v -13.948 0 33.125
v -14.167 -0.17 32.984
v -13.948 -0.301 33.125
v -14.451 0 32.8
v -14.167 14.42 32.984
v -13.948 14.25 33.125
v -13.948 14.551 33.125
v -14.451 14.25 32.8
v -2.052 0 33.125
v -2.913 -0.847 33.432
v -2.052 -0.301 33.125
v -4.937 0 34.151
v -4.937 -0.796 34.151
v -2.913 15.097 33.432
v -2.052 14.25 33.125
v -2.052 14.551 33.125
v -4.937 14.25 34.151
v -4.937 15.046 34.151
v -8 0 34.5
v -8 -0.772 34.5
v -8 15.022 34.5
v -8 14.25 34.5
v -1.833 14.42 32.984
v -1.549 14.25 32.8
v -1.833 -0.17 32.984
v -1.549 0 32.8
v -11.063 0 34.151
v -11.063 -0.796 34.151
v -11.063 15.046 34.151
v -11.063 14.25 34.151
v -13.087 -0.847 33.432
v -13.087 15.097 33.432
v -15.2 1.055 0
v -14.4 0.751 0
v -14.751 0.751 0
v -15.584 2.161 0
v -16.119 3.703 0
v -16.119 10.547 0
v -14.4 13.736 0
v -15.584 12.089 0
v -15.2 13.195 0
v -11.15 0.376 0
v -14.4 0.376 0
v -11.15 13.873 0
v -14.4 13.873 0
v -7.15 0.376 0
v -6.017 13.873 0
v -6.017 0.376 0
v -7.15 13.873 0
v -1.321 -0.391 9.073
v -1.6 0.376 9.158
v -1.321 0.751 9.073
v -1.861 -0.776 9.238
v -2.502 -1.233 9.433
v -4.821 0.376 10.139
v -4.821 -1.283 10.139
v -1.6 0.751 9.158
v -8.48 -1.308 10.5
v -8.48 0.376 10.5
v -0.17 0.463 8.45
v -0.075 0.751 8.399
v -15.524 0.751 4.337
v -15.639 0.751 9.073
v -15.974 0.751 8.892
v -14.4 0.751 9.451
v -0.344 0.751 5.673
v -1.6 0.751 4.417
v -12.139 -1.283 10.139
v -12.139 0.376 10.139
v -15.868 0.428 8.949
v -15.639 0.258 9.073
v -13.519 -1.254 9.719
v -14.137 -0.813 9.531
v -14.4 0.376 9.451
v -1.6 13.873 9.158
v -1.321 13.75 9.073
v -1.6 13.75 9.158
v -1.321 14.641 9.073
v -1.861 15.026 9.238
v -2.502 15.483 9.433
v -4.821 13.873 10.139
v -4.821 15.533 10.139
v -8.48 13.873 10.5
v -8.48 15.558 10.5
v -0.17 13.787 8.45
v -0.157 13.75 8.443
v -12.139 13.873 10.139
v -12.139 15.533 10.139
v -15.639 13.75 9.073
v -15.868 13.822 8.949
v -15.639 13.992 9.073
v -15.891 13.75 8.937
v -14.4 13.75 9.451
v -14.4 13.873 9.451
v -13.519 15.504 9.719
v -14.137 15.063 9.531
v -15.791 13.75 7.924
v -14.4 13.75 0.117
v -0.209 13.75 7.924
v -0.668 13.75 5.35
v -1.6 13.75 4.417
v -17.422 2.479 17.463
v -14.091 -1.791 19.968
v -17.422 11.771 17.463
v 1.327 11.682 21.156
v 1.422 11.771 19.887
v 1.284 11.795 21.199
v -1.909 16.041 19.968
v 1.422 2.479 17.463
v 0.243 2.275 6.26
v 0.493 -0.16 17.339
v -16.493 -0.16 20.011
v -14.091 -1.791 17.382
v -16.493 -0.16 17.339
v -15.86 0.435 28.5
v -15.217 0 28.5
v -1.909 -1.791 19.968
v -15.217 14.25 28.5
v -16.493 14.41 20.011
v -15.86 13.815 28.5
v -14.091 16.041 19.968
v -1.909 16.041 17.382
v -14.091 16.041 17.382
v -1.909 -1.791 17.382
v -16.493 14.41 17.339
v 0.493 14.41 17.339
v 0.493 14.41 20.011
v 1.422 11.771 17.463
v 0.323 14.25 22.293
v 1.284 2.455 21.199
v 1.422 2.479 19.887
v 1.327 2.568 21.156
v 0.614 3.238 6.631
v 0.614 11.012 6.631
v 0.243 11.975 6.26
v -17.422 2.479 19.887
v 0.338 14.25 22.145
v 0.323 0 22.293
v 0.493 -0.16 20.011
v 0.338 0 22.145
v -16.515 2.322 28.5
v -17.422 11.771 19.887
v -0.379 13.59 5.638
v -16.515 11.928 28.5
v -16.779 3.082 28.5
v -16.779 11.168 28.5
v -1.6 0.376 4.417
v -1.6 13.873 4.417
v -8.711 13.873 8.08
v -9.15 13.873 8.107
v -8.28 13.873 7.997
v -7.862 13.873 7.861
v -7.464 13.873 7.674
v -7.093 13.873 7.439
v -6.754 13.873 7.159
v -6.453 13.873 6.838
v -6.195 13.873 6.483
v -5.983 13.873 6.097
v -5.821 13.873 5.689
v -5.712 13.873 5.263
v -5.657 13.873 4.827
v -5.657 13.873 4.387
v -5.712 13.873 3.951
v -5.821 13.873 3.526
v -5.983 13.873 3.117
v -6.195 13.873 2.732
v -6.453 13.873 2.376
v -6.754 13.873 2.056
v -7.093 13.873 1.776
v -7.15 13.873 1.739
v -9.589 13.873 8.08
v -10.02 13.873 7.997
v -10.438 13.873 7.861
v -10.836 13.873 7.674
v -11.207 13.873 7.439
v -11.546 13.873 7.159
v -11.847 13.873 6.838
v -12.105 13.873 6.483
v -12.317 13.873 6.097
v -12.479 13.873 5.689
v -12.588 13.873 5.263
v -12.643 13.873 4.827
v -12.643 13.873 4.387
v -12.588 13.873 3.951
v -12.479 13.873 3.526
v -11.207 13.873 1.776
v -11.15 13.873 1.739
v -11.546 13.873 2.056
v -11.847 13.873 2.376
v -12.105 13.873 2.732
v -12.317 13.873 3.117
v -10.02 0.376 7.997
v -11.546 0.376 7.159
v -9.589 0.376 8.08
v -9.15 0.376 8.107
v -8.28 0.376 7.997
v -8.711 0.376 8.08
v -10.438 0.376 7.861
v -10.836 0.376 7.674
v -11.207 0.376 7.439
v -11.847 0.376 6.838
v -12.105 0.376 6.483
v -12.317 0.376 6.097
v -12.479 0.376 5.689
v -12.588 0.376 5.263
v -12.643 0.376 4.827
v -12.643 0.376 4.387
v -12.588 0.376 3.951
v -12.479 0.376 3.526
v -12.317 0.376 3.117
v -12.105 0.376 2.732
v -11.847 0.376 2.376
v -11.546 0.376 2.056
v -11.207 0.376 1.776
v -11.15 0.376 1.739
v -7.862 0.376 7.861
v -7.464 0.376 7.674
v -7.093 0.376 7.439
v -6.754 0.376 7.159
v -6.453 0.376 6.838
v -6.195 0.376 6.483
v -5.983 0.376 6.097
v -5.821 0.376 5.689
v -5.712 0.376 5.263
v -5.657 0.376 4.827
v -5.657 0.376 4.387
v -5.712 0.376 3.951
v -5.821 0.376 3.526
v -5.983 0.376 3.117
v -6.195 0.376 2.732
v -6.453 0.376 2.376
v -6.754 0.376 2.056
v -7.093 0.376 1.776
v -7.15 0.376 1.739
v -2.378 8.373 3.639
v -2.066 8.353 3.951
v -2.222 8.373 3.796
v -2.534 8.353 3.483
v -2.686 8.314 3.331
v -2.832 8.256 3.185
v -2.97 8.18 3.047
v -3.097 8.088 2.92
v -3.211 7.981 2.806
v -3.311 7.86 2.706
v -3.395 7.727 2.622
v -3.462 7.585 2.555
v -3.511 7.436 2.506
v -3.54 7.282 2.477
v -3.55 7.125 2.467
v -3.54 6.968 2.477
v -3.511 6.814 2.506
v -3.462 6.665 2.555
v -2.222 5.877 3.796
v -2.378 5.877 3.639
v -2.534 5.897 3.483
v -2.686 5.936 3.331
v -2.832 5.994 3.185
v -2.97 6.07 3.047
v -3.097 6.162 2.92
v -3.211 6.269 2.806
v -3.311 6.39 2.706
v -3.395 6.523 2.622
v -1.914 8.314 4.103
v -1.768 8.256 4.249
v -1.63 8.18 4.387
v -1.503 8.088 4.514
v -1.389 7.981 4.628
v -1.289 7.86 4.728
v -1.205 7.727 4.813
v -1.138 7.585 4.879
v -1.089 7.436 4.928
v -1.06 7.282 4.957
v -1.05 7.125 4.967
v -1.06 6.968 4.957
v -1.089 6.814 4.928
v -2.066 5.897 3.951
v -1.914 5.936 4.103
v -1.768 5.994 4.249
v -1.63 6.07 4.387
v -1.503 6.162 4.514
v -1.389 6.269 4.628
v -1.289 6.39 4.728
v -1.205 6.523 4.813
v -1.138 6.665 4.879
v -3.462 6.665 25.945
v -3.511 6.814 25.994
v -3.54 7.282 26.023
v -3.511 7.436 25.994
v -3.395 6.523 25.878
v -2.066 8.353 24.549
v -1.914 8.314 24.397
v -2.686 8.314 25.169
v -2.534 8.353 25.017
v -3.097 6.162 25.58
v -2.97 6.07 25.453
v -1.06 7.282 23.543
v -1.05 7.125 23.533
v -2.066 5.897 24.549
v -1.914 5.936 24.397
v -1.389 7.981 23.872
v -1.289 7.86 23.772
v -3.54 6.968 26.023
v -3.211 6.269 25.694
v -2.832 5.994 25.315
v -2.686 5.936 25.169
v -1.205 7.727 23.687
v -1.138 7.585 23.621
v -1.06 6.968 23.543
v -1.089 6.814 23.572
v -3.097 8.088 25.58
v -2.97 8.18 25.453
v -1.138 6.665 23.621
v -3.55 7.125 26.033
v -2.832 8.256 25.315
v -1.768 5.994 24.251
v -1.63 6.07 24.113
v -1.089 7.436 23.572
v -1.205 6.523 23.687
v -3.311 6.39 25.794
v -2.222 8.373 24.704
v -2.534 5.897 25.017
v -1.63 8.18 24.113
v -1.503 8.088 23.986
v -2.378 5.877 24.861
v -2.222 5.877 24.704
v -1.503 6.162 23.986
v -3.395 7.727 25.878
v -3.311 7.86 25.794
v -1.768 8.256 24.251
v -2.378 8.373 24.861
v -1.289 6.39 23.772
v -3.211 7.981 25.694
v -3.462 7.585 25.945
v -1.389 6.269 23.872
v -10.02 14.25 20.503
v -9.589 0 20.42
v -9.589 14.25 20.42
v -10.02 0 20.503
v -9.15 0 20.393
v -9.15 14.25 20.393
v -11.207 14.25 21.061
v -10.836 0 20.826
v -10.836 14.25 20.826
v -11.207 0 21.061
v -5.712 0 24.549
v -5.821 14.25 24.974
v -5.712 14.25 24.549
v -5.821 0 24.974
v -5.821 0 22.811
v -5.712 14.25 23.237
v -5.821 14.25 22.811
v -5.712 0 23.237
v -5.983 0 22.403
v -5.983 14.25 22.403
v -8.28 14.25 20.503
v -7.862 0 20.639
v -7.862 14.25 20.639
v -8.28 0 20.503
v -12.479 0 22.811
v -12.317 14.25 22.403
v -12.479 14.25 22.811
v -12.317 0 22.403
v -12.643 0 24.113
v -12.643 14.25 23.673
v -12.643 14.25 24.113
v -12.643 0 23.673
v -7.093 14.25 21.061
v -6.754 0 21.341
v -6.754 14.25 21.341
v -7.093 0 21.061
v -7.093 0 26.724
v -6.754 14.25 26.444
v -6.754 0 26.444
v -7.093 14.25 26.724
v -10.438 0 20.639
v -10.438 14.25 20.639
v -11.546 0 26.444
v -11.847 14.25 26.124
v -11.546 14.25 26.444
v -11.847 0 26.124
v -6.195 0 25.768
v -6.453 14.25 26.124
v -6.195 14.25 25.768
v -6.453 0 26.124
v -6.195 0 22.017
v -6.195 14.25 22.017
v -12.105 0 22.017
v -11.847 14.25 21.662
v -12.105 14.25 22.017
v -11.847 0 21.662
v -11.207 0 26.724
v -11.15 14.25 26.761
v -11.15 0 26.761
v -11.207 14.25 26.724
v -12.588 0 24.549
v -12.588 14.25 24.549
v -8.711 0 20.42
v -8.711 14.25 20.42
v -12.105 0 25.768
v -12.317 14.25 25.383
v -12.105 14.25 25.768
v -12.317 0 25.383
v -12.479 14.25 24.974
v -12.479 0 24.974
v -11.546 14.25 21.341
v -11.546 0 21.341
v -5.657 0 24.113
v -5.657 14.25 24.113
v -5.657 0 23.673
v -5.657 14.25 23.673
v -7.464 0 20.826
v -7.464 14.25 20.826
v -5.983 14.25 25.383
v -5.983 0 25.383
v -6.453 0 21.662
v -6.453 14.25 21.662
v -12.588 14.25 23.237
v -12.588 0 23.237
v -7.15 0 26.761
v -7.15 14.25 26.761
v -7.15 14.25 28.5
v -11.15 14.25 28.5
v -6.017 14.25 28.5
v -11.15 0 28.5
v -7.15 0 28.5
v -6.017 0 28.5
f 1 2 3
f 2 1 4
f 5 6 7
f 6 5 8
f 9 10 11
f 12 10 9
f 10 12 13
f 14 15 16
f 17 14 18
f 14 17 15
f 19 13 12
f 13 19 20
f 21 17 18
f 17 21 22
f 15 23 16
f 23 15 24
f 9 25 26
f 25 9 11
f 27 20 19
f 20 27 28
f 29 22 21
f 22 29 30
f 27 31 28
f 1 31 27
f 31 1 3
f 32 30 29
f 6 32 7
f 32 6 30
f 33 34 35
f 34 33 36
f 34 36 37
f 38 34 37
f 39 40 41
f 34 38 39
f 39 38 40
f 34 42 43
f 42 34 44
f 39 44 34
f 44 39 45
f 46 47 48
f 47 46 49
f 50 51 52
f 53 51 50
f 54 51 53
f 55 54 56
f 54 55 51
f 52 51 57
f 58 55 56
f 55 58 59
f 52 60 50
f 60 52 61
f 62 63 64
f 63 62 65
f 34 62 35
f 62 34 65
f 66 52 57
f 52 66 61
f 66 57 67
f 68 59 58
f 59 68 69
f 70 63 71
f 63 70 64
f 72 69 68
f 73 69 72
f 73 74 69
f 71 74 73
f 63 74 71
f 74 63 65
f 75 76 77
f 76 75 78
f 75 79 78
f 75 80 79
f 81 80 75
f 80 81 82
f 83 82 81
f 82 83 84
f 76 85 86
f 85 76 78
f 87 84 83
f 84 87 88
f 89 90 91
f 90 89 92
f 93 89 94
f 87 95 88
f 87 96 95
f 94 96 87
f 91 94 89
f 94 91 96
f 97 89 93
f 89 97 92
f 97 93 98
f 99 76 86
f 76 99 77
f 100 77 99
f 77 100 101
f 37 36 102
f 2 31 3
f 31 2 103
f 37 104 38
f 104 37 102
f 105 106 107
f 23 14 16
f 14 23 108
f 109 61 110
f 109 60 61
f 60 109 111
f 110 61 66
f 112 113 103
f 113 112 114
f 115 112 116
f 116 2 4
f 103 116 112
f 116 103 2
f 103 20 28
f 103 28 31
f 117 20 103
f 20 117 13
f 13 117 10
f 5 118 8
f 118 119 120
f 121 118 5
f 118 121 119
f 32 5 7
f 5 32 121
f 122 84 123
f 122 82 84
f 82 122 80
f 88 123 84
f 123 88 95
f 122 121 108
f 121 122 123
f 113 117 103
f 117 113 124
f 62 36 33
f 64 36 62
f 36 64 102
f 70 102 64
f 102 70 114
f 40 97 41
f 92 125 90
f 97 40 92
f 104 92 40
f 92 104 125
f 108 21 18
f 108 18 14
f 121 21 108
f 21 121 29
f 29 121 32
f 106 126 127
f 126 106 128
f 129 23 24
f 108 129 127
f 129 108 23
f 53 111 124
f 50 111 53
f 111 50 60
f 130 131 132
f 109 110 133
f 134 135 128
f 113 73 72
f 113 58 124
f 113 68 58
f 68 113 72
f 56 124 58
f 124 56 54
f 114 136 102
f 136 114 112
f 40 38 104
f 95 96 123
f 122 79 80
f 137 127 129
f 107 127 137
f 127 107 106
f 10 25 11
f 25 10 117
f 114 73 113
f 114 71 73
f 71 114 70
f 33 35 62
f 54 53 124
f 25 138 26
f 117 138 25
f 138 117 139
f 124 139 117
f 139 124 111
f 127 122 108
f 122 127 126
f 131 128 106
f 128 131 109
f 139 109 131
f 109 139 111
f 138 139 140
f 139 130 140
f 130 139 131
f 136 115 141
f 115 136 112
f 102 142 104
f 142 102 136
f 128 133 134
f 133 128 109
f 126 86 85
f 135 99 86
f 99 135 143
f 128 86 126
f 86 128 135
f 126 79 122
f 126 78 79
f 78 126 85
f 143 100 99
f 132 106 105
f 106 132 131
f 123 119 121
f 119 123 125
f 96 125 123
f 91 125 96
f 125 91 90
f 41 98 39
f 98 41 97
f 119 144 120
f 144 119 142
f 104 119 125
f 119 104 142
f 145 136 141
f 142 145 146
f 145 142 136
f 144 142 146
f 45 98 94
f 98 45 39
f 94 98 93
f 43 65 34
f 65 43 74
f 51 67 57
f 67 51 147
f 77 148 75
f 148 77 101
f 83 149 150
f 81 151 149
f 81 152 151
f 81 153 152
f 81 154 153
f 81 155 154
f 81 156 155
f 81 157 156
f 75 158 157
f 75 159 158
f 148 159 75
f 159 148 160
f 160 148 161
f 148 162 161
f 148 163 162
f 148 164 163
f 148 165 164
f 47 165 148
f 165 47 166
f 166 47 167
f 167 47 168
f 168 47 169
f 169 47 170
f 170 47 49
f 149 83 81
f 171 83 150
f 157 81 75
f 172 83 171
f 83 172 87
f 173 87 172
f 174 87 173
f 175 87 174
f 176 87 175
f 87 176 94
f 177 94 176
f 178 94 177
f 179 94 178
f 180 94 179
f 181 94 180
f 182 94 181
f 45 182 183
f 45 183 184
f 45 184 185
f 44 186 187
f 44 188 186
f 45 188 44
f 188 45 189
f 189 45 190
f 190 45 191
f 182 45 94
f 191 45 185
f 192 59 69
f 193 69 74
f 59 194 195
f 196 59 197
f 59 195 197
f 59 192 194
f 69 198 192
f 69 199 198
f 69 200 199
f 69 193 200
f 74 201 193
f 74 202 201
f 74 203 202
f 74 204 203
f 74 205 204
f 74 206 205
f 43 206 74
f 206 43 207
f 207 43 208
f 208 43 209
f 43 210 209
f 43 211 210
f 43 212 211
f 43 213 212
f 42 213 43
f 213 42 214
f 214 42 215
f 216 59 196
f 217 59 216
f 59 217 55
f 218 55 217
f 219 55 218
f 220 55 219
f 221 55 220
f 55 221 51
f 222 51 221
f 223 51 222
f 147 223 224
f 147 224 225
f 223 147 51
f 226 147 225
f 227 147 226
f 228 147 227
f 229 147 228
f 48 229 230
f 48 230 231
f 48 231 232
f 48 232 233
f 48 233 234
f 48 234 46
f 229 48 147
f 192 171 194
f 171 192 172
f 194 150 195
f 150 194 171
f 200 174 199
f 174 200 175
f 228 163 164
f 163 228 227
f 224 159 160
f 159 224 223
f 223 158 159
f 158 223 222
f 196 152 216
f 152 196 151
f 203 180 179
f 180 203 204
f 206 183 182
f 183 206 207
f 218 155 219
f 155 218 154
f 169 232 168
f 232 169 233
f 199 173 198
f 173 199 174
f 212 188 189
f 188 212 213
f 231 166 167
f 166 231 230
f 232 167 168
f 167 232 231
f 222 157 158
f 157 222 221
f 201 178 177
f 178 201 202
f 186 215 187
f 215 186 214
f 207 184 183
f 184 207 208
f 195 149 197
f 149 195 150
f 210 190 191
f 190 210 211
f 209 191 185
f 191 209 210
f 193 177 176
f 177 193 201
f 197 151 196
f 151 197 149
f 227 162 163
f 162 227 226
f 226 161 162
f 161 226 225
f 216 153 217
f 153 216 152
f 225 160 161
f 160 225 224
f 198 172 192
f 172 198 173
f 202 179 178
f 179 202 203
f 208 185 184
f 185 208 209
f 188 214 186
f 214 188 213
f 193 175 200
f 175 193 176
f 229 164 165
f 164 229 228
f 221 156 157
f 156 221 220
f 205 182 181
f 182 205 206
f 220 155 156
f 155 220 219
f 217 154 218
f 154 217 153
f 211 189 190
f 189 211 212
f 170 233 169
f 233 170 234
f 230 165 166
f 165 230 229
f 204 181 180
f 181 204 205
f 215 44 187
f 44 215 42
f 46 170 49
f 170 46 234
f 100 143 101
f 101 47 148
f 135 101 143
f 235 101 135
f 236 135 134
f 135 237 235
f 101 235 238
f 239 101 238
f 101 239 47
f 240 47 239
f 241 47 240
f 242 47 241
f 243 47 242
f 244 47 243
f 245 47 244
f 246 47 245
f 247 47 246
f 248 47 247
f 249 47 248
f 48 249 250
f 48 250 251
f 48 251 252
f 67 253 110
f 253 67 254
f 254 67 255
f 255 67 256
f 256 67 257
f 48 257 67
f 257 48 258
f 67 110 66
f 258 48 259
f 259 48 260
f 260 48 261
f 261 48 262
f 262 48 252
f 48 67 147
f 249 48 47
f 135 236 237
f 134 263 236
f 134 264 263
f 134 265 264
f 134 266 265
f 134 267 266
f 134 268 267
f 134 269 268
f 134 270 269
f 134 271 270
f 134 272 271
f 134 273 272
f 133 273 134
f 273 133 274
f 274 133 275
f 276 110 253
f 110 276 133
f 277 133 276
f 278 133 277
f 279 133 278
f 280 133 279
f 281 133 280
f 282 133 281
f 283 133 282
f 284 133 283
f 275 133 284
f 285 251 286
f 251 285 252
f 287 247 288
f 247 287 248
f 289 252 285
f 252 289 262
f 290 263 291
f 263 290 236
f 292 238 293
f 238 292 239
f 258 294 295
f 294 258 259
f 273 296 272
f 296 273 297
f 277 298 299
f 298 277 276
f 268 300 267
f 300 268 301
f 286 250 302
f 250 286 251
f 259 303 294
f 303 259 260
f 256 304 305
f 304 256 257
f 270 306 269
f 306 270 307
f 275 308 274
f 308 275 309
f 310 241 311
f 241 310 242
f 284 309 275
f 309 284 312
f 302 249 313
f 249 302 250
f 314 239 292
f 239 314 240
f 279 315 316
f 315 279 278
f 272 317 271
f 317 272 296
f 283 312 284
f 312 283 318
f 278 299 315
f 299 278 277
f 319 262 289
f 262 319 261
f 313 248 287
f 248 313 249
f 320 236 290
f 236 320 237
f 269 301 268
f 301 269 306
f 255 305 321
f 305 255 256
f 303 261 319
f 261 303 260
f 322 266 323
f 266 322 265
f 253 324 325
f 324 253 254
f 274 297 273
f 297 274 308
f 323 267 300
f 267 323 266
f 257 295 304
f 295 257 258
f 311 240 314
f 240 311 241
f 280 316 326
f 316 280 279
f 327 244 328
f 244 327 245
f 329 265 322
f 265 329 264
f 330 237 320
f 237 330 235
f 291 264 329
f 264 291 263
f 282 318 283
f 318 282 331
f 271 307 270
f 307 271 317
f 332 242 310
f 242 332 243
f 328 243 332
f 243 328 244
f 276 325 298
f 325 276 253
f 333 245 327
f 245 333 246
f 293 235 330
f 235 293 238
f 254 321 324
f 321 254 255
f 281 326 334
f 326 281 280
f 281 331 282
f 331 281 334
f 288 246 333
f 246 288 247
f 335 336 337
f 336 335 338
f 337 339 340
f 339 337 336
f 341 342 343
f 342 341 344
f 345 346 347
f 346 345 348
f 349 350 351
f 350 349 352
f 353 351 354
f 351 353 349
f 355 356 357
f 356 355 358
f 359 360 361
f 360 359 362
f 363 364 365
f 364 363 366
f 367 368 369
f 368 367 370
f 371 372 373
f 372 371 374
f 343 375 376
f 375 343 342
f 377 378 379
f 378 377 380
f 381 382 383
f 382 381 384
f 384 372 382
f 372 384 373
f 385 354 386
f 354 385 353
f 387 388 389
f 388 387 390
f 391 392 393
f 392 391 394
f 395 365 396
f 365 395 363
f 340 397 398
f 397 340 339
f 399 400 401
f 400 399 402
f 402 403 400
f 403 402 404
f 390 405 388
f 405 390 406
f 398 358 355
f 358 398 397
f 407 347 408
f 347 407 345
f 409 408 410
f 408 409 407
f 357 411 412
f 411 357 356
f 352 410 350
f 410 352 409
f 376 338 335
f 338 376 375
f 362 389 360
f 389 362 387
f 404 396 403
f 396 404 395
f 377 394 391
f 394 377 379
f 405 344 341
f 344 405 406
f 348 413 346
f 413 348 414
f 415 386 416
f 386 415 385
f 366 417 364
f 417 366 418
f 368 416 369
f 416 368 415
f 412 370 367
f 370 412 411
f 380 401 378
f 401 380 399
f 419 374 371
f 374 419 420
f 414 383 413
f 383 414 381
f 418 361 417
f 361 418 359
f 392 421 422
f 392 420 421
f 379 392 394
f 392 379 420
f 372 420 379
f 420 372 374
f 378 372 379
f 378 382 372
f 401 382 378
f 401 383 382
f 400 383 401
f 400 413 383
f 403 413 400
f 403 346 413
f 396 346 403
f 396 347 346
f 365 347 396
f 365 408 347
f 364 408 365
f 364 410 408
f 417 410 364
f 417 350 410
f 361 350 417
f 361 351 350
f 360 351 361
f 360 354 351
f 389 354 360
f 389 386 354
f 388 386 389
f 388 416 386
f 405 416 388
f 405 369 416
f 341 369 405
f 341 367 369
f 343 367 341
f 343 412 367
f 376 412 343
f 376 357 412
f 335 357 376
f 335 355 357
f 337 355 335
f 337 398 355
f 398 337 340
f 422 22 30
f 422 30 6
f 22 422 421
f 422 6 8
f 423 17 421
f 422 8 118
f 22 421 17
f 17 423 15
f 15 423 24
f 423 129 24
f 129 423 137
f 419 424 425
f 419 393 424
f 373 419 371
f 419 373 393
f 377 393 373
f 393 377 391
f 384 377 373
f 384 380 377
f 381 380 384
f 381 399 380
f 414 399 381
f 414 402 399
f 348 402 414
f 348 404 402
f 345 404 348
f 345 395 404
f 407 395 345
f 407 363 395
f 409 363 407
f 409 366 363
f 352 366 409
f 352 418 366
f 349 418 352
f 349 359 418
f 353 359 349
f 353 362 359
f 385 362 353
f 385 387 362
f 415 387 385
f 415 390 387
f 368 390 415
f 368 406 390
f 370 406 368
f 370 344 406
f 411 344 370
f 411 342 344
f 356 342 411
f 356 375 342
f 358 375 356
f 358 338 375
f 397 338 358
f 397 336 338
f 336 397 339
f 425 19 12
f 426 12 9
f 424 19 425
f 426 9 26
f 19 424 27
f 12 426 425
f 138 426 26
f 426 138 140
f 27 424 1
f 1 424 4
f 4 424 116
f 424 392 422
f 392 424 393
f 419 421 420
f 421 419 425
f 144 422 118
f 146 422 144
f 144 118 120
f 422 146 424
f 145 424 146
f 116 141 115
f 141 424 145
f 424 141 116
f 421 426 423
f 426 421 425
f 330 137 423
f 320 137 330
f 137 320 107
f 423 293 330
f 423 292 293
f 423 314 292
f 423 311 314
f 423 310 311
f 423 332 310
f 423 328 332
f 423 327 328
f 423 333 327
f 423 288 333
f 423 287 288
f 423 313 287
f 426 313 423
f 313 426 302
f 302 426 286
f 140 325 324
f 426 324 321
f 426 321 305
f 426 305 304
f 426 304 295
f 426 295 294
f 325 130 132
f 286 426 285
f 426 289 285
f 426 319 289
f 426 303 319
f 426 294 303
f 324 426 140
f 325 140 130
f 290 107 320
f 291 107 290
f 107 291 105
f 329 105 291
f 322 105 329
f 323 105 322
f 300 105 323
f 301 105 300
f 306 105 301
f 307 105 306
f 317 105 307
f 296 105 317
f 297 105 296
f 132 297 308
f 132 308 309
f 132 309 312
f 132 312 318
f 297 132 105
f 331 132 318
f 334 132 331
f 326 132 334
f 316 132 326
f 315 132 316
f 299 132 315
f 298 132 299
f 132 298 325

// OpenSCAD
// file: finger_base.scad
include <../../config.scad>

rotate([0,-90,0]) fingerbase();

//	Base segment of finger, can be lengthened
module fingerbase(length=20, proximalHole=true, distalHole=true)
{
	difference() {
		scale([yScaleFactor,xScaleFactor,zScaleFactor]) {
			fingerbasesolid(length);
		}
		if(proximalHole) {
			translate([0,knucklePadding/2 * xScaleFactor,0]) fingerhardwarecutouts(jointDia, jointThick, knuckleW=knuckleW-knucklePadding, fingerLen=length);
		}
		if (distalHole) {
			translate([length * yScaleFactor,0,0]) mirror([1,0,0]) fingerhardwarecutouts(jointDia, jointThick, knuckleW=knuckleW, fingerLen=length);
		}
	}


	
}

module fingerhardwarecutouts(jointDia,jointThick,knuckleW,fingerLen,holeCutoff=100) {
	//slot for flex joint
	translate([7 - (15/jointDia),0,6*zScaleFactor - (1.8/jointThick)]) {
		rotate([90,0,0]) translate([-0.25,0,-knuckleW*xScaleFactor]) cylinder(d=jointDia, h=knuckleW*xScaleFactor, $fn=50);
		translate([-25,(knuckleW*xScaleFactor) / 2,0]) cube([50,knuckleW*xScaleFactor,jointThick], center=true);
	}
	//cubic parts
	translate([-100,0,0]) cube([100,knuckleW*xScaleFactor,100]);
	translate([-13/zScaleFactor,0,0]) rotate([0,45,0]) translate([-50,0,0]) cube([100,knuckleW * xScaleFactor, 10]);

	//channel for string/tendon
	translate([-fingerLen/2 * yScaleFactor, knuckleW/2 * xScaleFactor, 2.3]) rotate([0,90,0]) cylinder(d=2.5, h=holeCutoff, $fn=50);
}

//	base segment of finger, solid
module fingerbasesolid(length=50, cutout=true) {
	difference() {
		//cubic part
		translate([0,0.001 + knucklePadding/2,1]) cube([length, knuckleW - knucklePadding - 0.002, 8]);
	}
	
	//cylindrical-ish part around finger
	intersection() {
		//overly large shape to get the cross section in the XZ plane from
		difference() {
			union() {
				translate([length-4,-5,5]) rotate([-90,0,0]) cylinder(r=8,h=knuckleW + 10);
				translate([0,-5,-5]) cube([length,knuckleW + 10,20]);
			}
			//cutout for the side "guards" of the previous knuckle
			if(cutout) {
				translate([-4,-knuckleW+0.001,5.3]) rotate([-90,0,0]) cylinder(r=11,h=10);
				translate([-4,knuckleW - knucklePadding*(1/xScaleFactor),5.3]) rotate([-90,0,0]) cylinder(r=11,h=10);
			}
		}

		hull() {
			for(i=[-1,1], j=[-1,1]) {
				//angled cylinders to provide the outer shape of the finger
				translate([length/10,i*2.4 + knuckleW/2,j*2.2 + 5]) rotate([i*j*-4,j*86,0]) cylinder(d=6,h=20,center=true);
				translate([length+4, i*2.4 + knuckleW/2, j*2.2 + 5]) rotate([i*j*-4,j*-86,0]) cylinder(d=6,h=20,center=true);
			}
		}
	}
}
// file: ../../config.scad
/**
 * Configuration settings for Flexy Beast, required to generate correctly sized STLs of the printed parts. See the Configuration File Assembly instructions to set this up.
 * @id config_file
 * @name Configuration File
 * @category Prerequisites!
 * @step Open config.scad in your favorite text editor.
 * @step As per the normal Cyborg Beast instructions, measure the width of the knuckles in the non-affected hand and convert to millimeters.
 * @step Add 5 to that result and then divide by 55.
 * @step Replace the x-, y-, and zScaleFactor variables in config.scad with that number.
 * @step If desired, adjust the proportions of the hand by changing those variables individually. xScaleFactor controls the width of the hand, yScaleFactor controls the length, and zScaleFactor controls the height.
 * @step Open assembly.scad in OpenSCAD to check that the flexy joint holes are not too large for the hand (should only be necessary for small children). If necessary, reduce the jointDia and jointThick variables. jointDia=5 and jointThick=2 is a good amount for smaller hands.
 * @step Set the fingerPads variable to true or false depending on whether you want to cast silicone finger pads for improved grip.
 * @step Open palm.scad, finger_base.scad, finger_tip.scad, and thumb_tip.scad in OpenSCAD, render each part (F6), and export as STL, then print. Suggested print settings are 0.2mm or smaller layer height, 3 perimeters, and 25% rectilinear or hexagonal infill.
 */

knuckleR = 4.85;
knucklePadding = 0.5;
knuckleW = 9.5;
wristH = 10;
palmH = 20;
palmW = 64;
th = 3;
fn = 32;

//flexy joint parameters
jointDia = 7;
jointThick = 4;

//finger settings
fingerPads = true; //whether or not to hollow the finger tips slightly for molding pads
padPositive = false; //if false (default), finger_tip_mold.scad renders a mold to make silicone finger pads; if true, renders a printable flexible finger pad
fingerLength = 1; //multiply the length of all fingers by this amount
thumbProp = 0.8; //proportion of thumb length relative to other fingers (note that the thumb is a segment shorter than the other fingers already)
indexProp = 0.8; //proportion of index finger length relative to other fingers
middleProp = 1; //proportion of middle finger length relative to other fingers
ringProp = 0.8; //proportion of ring finger length relative to other fingers
pinkyProp = 0.7; //proportion of pinky finger length relative to other fingers

//misc settings
thermoform = true; //whether or not to generate a thermoformable mesh for the palm

//desired scale factor for hand based on the standard Cyborg Beast/Robohand sizing guide
xScaleFactor = 1.5; // [1.05:1.60]
yScaleFactor = 1.5; // [1.05:1.60]
zScaleFactor = 1.6; // [1.05:1.60]
// main file
include <../../config.scad>
use <finger_base.scad>

rotate([0,-90,0]) fingermid();

//	Middle segment of finger, can be lengthened
module fingermid(length=19, proximalHole=true, distalHole=true)
{
	difference() {
		scale([yScaleFactor,xScaleFactor,zScaleFactor]) {
			fingerbasesolid(length);
		}
		if(proximalHole) {
			translate([0,knucklePadding/2 * xScaleFactor,0]) fingerhardwarecutouts(jointDia, jointThick, knuckleW=knuckleW-knucklePadding, fingerLen=length);
		}
		if(distalHole) {
			translate([length * yScaleFactor,0,0]) mirror([1,0,0]) fingerhardwarecutouts(jointDia, jointThick, knuckleW=knuckleW, fingerLen=length);
		}
	}
}
